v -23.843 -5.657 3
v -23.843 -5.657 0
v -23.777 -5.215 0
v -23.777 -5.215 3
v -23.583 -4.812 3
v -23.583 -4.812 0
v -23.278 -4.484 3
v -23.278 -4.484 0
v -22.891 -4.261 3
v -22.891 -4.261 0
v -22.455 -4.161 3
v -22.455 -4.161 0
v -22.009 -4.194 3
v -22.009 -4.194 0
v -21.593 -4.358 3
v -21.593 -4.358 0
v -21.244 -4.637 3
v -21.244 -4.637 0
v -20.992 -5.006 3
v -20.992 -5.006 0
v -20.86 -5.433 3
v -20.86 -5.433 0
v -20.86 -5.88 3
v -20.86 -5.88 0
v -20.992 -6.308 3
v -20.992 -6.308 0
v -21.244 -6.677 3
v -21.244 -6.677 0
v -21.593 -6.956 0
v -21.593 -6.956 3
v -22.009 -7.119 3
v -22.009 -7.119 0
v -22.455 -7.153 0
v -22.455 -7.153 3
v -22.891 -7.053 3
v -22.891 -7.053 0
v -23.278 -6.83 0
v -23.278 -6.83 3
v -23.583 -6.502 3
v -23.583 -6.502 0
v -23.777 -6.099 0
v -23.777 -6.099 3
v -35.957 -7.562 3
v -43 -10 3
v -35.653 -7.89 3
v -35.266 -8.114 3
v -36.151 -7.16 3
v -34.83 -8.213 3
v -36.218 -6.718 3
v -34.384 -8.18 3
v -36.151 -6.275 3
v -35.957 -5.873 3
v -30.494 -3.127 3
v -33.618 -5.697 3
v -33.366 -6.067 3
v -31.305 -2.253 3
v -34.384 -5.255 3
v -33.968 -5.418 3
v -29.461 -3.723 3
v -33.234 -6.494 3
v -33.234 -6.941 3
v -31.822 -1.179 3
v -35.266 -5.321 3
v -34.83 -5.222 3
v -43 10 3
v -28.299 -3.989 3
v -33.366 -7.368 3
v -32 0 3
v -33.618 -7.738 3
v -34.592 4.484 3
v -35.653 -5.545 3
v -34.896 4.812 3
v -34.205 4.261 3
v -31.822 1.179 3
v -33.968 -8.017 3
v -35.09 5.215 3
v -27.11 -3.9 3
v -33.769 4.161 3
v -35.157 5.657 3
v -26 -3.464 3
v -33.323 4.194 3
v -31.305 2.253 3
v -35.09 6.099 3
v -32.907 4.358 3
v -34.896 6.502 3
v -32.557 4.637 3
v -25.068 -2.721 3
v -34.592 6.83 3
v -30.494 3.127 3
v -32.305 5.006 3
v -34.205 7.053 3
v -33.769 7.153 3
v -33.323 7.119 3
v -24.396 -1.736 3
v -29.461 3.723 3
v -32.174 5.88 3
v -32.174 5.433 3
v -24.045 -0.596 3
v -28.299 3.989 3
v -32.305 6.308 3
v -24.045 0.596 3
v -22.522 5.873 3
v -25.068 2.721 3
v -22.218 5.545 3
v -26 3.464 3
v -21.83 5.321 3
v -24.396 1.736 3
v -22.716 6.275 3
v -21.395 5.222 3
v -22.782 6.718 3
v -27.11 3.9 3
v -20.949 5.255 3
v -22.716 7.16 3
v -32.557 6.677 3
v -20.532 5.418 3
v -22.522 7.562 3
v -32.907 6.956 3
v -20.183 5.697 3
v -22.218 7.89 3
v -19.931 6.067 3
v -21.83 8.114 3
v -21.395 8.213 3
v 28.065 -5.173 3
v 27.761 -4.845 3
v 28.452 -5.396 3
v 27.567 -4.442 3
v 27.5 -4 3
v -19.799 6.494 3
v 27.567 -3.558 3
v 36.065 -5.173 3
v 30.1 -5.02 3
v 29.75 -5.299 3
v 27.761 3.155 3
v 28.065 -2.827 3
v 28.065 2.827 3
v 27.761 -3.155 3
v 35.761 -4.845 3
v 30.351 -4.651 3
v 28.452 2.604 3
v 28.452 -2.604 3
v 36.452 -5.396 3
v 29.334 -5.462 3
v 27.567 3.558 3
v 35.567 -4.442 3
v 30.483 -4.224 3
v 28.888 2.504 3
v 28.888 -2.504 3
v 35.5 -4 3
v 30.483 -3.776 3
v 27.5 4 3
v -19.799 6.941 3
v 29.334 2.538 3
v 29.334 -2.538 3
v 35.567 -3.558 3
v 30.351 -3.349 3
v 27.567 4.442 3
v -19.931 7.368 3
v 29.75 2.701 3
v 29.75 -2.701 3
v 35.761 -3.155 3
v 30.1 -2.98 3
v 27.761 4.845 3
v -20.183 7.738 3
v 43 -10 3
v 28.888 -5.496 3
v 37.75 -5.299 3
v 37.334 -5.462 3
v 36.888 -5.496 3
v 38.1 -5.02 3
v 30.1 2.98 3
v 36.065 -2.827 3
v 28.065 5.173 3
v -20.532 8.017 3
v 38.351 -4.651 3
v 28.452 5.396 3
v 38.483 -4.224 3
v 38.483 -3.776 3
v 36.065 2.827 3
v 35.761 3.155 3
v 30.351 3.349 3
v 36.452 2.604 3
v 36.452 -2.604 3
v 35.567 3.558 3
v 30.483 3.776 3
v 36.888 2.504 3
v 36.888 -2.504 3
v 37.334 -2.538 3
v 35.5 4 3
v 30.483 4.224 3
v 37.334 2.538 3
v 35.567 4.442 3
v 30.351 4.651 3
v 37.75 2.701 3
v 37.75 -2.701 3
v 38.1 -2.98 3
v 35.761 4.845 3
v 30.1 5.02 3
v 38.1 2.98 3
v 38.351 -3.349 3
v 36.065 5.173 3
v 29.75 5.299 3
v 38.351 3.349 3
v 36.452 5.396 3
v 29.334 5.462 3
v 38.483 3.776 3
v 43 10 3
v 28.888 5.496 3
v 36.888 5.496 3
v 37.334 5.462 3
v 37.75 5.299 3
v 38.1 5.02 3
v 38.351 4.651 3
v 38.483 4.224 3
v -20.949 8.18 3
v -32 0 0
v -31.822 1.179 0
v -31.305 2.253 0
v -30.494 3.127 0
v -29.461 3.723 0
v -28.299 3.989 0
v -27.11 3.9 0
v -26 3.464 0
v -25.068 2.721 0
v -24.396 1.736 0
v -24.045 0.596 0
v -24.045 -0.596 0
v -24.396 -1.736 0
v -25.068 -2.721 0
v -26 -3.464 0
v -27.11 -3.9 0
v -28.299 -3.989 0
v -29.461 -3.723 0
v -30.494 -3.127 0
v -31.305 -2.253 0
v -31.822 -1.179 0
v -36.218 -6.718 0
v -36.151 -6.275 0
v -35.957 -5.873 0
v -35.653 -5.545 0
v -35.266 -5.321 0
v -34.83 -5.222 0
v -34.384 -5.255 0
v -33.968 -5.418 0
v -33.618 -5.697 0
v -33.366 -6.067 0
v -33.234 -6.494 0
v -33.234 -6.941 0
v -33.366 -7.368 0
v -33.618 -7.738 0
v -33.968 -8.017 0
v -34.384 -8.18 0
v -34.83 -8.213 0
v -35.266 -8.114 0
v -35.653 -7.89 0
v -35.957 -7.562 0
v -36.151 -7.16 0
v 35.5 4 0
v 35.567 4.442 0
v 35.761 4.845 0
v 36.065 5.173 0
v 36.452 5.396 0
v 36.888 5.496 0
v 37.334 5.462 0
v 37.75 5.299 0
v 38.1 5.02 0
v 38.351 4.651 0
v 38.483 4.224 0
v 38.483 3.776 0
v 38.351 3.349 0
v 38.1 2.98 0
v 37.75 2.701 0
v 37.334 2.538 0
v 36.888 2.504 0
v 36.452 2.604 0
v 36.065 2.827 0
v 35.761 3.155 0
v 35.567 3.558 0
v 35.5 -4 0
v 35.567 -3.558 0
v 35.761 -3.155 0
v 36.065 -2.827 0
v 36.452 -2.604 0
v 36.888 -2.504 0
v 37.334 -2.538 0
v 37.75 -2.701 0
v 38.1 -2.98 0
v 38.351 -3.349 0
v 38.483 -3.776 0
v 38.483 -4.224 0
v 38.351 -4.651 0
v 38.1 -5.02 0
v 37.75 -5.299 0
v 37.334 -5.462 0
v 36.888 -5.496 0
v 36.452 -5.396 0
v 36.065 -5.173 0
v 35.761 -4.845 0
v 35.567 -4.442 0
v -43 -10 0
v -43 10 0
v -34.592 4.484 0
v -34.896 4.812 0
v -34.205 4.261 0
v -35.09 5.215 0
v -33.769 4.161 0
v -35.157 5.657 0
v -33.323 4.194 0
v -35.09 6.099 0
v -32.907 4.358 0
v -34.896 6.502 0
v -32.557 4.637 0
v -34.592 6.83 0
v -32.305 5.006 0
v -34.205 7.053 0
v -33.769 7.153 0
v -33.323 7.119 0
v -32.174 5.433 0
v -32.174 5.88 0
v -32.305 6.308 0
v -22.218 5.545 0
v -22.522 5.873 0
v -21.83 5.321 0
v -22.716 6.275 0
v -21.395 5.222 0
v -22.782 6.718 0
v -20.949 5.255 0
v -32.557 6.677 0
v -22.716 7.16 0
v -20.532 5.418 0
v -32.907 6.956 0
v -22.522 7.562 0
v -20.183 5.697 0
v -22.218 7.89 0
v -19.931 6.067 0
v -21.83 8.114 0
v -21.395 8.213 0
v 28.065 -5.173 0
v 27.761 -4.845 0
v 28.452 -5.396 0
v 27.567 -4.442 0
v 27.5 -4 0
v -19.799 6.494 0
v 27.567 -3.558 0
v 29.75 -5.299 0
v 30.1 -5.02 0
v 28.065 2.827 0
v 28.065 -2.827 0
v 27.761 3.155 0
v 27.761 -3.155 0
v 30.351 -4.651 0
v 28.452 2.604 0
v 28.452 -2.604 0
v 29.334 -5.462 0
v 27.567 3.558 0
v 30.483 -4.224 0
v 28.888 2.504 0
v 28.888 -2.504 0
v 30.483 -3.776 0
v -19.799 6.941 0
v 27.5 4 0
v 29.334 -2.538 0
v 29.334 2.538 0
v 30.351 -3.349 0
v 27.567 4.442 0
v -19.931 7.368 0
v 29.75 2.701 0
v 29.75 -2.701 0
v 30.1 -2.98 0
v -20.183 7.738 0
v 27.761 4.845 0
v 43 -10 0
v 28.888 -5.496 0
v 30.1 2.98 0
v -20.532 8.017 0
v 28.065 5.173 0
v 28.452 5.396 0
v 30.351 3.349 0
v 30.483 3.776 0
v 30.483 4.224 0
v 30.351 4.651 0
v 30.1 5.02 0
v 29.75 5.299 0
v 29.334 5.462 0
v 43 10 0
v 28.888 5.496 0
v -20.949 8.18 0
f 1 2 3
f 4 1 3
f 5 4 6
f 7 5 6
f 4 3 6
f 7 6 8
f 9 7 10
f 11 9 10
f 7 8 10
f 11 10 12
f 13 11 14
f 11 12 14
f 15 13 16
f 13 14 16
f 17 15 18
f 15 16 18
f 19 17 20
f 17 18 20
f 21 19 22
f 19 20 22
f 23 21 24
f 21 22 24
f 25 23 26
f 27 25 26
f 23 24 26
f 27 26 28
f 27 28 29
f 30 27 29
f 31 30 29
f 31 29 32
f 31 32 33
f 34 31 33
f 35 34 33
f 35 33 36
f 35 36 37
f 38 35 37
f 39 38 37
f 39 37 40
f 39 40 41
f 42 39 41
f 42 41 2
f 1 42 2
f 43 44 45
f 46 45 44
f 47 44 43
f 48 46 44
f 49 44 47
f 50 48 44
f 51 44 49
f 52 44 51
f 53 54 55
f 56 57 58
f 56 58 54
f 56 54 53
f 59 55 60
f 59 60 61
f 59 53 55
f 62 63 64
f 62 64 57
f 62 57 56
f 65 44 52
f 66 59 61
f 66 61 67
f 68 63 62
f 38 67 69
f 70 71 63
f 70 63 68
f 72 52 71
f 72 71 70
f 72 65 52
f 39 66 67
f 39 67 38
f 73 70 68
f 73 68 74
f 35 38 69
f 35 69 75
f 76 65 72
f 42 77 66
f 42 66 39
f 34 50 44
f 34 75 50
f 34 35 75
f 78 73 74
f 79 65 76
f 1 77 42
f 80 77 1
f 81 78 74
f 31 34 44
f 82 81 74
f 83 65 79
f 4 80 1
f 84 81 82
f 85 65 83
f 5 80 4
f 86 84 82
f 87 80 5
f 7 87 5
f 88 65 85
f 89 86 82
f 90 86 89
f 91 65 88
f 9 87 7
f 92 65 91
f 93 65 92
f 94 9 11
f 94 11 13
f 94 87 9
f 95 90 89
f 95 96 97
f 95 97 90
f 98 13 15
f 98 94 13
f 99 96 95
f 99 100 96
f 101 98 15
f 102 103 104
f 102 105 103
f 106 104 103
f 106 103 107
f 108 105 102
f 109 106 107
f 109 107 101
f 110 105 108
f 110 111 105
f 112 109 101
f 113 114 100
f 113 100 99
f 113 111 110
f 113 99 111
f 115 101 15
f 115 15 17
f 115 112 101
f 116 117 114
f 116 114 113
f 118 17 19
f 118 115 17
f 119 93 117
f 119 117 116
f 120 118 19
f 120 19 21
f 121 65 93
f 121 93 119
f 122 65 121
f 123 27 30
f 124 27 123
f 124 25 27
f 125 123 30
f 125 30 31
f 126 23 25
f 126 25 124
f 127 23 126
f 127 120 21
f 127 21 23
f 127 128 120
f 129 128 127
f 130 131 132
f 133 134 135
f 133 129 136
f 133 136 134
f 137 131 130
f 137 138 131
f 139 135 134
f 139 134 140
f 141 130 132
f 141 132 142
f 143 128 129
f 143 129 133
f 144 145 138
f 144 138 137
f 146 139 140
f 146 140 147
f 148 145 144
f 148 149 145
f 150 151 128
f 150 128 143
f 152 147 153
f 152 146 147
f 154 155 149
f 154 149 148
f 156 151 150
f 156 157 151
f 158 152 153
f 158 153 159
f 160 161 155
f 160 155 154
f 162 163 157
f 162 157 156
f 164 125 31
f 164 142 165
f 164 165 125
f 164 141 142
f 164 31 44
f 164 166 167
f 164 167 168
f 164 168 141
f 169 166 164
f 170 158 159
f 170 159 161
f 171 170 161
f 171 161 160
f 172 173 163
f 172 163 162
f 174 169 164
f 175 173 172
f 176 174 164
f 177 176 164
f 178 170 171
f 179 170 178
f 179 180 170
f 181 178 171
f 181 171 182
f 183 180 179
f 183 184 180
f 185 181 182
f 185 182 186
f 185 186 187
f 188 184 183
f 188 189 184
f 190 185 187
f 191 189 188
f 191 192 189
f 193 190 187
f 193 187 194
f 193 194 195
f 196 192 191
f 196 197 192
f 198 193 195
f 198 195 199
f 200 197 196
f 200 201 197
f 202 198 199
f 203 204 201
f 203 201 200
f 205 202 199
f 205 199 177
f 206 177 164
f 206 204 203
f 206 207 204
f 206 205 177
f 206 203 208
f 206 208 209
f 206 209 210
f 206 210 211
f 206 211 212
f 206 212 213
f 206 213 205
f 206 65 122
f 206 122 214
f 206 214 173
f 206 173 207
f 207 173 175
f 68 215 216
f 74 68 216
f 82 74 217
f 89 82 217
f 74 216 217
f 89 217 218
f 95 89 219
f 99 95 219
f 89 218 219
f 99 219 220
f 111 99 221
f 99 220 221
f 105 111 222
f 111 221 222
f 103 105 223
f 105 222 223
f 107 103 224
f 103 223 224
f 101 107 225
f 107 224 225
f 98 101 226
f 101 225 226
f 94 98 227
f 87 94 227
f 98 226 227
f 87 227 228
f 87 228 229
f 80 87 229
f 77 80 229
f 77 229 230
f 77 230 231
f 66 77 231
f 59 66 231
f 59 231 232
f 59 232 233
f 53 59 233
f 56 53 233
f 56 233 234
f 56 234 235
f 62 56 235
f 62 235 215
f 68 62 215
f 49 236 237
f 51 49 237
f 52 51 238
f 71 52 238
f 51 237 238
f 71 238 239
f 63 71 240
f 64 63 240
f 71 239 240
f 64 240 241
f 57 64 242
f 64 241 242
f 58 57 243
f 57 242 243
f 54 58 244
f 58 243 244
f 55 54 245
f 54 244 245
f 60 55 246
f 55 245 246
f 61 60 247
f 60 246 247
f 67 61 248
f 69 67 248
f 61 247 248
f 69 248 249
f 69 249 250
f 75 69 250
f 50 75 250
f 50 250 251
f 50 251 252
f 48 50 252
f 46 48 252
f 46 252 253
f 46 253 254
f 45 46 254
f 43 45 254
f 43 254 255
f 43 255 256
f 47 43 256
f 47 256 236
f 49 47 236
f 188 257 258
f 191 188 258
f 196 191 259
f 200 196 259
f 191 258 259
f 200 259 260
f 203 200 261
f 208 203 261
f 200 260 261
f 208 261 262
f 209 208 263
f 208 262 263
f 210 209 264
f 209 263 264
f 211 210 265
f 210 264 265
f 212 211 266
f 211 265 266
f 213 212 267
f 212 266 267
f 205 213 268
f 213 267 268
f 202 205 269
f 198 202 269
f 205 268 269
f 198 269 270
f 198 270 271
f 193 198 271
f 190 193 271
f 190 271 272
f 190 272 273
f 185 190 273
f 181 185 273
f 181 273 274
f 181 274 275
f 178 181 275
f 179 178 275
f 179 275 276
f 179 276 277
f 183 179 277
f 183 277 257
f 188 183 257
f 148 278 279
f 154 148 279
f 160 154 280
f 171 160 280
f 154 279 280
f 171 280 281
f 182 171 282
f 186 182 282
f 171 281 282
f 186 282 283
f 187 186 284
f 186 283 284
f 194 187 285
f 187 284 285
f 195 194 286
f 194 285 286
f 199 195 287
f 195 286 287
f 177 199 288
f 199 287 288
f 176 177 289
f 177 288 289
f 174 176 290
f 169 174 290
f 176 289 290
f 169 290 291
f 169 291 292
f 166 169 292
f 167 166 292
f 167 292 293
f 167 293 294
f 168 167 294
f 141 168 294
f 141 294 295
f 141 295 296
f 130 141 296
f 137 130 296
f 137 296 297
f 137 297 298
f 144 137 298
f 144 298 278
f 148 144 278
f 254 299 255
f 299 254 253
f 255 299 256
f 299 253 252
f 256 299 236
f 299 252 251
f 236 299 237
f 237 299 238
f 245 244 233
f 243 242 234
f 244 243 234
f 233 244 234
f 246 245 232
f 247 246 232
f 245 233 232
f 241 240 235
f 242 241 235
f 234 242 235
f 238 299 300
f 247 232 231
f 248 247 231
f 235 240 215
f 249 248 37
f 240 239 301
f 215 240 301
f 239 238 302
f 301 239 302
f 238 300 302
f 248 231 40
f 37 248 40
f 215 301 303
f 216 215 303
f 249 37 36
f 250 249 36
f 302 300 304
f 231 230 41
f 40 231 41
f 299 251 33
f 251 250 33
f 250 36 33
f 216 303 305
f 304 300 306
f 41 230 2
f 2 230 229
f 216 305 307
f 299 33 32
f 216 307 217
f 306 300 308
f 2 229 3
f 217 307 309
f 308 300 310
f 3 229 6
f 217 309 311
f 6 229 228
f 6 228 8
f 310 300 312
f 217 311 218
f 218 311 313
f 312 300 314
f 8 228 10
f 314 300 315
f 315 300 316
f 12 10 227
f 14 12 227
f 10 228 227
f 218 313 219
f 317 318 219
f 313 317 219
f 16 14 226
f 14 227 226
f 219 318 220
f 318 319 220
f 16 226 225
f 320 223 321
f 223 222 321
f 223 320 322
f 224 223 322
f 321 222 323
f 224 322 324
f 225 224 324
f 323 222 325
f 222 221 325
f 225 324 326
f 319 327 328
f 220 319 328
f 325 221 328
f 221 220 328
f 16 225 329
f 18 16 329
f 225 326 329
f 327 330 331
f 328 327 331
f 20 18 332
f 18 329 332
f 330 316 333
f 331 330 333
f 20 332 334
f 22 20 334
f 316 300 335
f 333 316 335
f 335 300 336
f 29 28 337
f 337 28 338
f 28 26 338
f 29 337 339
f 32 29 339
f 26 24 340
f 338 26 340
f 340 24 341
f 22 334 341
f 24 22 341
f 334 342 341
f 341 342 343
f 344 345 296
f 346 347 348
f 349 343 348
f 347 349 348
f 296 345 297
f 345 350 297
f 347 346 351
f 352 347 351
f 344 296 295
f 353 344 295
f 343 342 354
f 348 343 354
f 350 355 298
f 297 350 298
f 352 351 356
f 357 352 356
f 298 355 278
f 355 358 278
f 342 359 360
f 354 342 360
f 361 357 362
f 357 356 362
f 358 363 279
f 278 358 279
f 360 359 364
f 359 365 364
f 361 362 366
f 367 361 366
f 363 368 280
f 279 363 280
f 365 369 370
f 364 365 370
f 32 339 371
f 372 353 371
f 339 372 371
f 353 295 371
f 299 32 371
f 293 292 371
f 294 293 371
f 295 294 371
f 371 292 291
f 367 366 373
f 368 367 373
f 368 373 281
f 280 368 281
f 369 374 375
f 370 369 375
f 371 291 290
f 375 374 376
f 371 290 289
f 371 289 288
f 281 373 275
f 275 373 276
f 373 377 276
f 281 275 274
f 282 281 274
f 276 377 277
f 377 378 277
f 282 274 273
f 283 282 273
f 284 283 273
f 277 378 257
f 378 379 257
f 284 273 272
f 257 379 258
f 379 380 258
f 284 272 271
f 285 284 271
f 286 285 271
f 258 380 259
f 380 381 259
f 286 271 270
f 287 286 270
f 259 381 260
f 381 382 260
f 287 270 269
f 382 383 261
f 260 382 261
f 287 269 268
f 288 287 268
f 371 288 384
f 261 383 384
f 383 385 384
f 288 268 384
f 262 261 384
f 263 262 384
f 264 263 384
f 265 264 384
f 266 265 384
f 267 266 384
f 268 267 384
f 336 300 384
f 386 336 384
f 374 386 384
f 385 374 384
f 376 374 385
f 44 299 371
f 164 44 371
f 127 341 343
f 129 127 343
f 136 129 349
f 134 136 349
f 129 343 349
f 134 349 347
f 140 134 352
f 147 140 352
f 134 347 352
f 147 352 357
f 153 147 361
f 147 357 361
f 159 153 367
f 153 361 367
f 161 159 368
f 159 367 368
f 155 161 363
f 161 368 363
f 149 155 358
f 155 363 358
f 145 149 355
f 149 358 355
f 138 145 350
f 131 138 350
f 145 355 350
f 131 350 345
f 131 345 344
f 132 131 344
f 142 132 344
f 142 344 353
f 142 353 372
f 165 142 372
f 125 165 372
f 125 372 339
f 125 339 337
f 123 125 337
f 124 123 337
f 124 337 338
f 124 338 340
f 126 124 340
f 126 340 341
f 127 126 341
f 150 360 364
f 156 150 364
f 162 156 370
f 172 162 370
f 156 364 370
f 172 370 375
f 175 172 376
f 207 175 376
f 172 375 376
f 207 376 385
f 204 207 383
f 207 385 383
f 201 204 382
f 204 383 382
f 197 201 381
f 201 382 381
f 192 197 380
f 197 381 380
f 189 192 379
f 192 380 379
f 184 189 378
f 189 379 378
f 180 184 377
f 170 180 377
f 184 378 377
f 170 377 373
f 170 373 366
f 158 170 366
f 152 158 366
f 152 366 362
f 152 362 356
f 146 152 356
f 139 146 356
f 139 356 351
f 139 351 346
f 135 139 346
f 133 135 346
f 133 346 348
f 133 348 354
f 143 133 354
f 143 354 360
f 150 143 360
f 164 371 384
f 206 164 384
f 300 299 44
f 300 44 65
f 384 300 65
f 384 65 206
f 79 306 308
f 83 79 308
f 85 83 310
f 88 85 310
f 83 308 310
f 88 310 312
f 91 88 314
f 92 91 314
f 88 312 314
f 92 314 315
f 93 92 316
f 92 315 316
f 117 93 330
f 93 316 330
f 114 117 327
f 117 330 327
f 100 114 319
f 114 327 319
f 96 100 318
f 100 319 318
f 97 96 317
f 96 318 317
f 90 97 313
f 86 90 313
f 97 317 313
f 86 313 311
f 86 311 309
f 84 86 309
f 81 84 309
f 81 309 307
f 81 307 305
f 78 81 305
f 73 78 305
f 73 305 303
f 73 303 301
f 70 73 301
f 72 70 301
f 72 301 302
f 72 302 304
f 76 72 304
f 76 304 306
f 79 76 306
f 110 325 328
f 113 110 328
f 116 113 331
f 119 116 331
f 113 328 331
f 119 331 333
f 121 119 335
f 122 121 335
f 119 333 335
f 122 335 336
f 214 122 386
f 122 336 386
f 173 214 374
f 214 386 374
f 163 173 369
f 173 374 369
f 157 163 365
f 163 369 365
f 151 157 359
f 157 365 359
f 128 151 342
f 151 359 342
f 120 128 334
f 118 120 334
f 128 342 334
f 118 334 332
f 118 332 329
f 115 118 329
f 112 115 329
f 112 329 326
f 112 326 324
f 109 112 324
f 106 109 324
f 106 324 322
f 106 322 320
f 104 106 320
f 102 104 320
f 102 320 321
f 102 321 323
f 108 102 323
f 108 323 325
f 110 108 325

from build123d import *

# Parameters (mm, degrees)
F0_W     = 86
F0_H     = 20
F1_DEPTH = 3
F3_D     = 3
F4_D     = 8
F5_D     = 3


with BuildPart() as f1:
    # F0 (on Top) → F1 (new body)
    with BuildSketch(Plane.XY):
        Rectangle(F0_W, F0_H)
    extrude(amount=F1_DEPTH)

    # F3 (through all)
    with Locations(Plane.XY.offset(3)):
        with Locations((37, 4), (37, -4), (29, -4), (29, 4)):
            Hole(F3_D / 2)

    # F4 (through all)
    with Locations(Plane.XY.offset(3)):
        with Locations((-28, 0)):
            Hole(F4_D / 2)

    # F5 (through all)
    with Locations(Plane.XY.offset(3)):
        with Locations((-34.717514, -6.717514), (-33.656854, 5.656854), (-21.282486, 6.717514), (-22.343146, -5.656854)):
            Hole(F5_D / 2)


solid = f1.part
